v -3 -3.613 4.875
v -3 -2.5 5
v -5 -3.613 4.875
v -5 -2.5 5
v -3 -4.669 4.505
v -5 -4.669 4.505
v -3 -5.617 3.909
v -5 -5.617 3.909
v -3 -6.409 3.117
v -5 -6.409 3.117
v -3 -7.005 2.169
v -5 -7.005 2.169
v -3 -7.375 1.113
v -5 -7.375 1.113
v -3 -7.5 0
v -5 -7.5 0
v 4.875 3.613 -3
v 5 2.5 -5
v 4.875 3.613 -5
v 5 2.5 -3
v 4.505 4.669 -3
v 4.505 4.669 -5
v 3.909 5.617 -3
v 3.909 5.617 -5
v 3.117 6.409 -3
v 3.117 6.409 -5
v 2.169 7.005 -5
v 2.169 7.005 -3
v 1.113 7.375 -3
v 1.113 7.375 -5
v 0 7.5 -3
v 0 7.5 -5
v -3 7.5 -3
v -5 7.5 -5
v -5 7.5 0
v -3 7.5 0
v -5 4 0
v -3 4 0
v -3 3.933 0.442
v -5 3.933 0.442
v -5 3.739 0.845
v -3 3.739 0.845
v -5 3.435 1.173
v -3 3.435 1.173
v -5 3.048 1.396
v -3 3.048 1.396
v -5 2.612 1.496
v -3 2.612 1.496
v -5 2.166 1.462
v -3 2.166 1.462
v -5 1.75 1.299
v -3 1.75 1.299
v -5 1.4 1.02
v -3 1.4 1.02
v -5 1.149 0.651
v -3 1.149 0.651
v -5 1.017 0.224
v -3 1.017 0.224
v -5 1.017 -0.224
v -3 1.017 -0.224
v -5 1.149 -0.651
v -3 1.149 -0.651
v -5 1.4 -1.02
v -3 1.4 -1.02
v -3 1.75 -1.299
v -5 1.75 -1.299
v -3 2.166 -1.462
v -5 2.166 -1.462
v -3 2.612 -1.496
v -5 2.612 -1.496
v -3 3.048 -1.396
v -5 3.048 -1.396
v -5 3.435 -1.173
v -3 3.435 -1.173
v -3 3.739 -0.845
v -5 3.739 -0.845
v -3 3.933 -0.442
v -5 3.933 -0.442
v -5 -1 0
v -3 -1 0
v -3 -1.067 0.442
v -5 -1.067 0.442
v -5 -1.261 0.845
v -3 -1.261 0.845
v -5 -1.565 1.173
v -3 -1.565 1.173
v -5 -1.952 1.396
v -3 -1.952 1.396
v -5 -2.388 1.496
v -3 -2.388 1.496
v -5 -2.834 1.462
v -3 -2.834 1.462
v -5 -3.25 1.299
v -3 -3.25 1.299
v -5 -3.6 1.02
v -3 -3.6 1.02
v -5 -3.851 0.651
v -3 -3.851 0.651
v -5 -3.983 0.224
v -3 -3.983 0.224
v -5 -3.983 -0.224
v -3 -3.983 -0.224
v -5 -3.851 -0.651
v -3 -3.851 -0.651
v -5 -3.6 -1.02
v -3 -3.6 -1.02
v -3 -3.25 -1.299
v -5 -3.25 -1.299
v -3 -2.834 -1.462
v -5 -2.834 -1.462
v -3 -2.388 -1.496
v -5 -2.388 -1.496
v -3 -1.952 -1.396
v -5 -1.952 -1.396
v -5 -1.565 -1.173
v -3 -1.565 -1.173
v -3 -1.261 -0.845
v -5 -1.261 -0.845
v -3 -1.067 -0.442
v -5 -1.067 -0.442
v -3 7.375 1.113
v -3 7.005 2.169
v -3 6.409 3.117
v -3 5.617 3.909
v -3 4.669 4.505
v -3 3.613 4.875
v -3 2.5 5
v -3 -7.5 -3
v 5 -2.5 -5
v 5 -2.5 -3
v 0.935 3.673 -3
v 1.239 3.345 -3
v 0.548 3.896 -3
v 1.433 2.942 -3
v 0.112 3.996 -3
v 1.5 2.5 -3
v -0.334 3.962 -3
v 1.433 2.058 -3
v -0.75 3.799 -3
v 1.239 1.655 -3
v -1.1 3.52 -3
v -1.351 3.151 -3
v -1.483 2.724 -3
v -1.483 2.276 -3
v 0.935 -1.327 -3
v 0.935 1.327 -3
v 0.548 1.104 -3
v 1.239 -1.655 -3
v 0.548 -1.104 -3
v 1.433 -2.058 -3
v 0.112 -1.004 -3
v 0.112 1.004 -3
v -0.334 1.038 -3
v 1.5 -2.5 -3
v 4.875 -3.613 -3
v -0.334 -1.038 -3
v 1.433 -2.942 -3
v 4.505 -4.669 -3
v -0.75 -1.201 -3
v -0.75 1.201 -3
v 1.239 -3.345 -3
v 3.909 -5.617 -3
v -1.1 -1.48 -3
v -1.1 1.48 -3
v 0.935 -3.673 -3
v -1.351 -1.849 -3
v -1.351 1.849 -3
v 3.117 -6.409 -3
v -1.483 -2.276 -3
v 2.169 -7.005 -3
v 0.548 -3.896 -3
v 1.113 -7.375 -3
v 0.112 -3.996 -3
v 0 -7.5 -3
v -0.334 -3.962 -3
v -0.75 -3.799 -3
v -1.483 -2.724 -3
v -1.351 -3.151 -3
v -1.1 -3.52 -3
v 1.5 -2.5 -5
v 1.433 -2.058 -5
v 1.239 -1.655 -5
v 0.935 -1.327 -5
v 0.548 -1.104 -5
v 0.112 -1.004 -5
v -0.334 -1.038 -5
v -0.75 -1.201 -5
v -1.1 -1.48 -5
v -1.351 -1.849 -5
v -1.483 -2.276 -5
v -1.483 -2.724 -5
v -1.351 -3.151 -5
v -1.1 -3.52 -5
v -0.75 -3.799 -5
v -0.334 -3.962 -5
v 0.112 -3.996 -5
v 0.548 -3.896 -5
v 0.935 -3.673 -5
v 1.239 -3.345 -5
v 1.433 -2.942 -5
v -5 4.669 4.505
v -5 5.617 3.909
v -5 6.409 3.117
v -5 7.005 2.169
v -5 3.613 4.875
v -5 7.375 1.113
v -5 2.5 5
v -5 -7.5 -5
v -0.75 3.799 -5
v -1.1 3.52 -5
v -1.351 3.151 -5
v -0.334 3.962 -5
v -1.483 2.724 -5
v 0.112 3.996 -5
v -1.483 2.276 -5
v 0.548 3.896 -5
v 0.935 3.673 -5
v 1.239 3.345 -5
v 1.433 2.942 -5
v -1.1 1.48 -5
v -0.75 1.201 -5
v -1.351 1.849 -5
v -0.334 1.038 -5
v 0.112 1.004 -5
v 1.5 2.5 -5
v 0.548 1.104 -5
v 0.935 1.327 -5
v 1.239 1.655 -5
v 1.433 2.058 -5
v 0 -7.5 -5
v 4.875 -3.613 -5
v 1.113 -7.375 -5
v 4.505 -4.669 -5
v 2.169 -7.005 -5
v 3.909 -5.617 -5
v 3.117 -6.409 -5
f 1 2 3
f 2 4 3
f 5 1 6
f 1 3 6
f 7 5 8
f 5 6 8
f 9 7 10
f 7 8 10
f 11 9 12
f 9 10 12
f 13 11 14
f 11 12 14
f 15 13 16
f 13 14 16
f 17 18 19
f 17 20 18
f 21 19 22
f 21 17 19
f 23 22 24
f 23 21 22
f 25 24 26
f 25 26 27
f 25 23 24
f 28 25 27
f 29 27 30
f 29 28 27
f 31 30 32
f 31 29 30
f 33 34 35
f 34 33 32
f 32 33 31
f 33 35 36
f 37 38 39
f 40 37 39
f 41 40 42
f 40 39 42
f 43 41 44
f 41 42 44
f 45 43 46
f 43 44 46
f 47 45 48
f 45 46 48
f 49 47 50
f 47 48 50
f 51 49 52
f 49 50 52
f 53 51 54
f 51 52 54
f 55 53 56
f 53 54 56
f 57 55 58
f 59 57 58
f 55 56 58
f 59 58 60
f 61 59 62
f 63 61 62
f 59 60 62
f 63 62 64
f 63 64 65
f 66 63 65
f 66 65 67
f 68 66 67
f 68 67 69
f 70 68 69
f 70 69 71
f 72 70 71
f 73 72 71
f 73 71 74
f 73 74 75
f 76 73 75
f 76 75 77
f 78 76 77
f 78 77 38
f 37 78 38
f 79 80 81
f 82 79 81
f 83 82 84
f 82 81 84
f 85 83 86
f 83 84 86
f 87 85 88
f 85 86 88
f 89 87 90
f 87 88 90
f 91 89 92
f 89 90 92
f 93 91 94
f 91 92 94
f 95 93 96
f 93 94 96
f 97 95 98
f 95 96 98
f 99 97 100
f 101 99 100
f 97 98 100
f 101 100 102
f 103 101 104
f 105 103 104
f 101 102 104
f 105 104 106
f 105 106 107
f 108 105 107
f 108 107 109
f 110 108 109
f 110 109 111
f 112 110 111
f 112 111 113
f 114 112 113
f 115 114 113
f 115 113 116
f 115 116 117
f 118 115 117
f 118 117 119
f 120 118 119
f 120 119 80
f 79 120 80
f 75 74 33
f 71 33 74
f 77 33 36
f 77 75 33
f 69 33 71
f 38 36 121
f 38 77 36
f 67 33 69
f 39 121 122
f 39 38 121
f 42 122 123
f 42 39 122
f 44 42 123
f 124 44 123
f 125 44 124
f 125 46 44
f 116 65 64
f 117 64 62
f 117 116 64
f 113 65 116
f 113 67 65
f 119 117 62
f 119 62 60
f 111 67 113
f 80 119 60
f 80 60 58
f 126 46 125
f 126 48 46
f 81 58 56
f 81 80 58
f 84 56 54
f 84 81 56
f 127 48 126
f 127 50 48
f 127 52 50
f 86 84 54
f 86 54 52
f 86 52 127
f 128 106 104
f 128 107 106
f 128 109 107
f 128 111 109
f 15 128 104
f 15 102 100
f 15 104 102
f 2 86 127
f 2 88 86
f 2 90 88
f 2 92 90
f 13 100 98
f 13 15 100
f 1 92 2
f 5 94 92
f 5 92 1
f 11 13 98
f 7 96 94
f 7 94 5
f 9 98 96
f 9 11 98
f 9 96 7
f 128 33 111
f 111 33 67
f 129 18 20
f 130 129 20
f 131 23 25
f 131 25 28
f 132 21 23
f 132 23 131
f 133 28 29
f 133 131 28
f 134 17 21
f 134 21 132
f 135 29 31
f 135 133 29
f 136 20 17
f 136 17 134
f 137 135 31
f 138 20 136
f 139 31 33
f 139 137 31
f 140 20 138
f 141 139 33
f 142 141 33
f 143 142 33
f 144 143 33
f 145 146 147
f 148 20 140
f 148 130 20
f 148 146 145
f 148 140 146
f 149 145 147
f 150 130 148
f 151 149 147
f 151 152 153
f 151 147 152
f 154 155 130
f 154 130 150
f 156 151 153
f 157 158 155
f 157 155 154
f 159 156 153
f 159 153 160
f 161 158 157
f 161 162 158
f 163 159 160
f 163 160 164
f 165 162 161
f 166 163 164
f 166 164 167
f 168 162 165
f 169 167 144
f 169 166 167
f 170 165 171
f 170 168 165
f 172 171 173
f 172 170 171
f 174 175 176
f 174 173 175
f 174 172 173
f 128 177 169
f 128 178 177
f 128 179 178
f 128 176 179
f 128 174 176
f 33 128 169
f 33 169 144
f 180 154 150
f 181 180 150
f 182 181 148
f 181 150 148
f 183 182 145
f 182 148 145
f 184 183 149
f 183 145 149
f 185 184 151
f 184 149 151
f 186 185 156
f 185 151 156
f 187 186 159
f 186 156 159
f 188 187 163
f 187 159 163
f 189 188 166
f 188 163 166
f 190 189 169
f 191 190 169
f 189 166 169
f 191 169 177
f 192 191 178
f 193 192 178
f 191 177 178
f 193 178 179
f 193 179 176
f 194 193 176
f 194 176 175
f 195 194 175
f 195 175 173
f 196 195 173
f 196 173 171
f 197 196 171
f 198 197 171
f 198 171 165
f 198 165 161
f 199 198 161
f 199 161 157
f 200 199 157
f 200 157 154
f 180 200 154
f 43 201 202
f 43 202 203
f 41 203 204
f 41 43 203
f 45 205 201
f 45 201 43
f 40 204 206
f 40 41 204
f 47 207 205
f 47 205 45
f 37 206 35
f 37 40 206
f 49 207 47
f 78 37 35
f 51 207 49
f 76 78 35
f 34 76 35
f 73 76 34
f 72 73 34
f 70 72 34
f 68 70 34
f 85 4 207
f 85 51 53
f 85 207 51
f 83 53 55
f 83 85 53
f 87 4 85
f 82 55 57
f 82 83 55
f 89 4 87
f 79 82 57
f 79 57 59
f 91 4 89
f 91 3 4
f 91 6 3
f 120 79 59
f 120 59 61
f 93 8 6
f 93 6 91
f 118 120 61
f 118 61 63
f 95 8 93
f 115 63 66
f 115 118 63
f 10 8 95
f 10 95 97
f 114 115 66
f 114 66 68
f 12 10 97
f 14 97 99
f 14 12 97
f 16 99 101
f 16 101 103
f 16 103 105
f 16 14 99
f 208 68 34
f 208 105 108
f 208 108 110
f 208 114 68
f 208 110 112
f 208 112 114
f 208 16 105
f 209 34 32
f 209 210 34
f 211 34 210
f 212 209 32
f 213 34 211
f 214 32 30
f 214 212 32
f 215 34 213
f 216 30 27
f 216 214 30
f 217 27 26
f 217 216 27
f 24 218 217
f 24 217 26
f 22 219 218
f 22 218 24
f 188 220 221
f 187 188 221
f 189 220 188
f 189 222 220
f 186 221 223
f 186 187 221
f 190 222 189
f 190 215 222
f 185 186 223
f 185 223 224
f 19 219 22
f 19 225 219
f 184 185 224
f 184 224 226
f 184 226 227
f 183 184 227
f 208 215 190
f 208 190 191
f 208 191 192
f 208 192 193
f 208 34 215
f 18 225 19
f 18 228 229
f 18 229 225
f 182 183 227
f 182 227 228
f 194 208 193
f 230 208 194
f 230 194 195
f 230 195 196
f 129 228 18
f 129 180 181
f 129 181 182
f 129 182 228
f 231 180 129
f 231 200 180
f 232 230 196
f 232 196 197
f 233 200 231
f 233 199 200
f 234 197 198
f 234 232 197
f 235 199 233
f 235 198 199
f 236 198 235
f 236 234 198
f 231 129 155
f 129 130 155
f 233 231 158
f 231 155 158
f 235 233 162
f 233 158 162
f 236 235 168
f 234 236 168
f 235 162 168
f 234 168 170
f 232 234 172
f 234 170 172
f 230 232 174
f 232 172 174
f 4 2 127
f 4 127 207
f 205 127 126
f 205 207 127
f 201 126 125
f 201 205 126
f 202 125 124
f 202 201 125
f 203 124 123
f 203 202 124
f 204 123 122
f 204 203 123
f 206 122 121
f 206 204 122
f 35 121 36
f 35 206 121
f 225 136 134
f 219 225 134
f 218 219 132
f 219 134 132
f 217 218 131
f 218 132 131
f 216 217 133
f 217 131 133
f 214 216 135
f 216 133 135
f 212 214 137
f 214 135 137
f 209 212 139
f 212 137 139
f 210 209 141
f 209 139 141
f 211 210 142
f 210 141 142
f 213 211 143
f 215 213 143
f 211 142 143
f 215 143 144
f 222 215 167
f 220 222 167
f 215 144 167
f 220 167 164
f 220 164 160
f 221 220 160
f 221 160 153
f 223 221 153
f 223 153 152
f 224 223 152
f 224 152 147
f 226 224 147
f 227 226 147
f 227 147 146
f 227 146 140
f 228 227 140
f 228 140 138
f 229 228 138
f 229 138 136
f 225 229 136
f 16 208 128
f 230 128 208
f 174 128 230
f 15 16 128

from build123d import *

# Parameters (mm, degrees)
F1_DEPTH = 7.5
F2_R     = 5
F3_R     = 1.5
F4_DEPTH = 5
F5_R     = 1.5
F6_DEPTH = 5


with BuildPart() as f1:
    # F0 (on Front) → F1 (new body, symmetric)
    with BuildSketch(Plane.XZ):
        Polygon((-3, 5), (-5, 5), (-5, -5), (5, -5), (5, -3), (-3, -3), align=None)
    extrude(amount=F1_DEPTH, both=True)

    # F2
    f2_edges = [f1.edges().sort_by_distance(p)[0] for p in [
        (-4, -7.5, 5),
        (-4, 7.5, 5),
        (5, -7.5, -4),
        (5, 7.5, -4),
    ]]
    fillet(f2_edges, radius=F2_R)

    # F3 (on Right) → F4 (cut)
    with BuildSketch(Plane.YZ):
        with Locations((-2.5, 0)):
            Circle(F3_R)
        with Locations((2.5, 0)):
            Circle(F3_R)
    extrude(amount=-F4_DEPTH, mode=Mode.SUBTRACT)

    # F5 (on Top) → F6 (cut)
    with BuildSketch(Plane.XY):
        with Locations((0, 2.5)):
            Circle(F5_R)
        with Locations((0, -2.5)):
            Circle(F5_R)
    extrude(amount=-F6_DEPTH, mode=Mode.SUBTRACT)


solid = f1.part
